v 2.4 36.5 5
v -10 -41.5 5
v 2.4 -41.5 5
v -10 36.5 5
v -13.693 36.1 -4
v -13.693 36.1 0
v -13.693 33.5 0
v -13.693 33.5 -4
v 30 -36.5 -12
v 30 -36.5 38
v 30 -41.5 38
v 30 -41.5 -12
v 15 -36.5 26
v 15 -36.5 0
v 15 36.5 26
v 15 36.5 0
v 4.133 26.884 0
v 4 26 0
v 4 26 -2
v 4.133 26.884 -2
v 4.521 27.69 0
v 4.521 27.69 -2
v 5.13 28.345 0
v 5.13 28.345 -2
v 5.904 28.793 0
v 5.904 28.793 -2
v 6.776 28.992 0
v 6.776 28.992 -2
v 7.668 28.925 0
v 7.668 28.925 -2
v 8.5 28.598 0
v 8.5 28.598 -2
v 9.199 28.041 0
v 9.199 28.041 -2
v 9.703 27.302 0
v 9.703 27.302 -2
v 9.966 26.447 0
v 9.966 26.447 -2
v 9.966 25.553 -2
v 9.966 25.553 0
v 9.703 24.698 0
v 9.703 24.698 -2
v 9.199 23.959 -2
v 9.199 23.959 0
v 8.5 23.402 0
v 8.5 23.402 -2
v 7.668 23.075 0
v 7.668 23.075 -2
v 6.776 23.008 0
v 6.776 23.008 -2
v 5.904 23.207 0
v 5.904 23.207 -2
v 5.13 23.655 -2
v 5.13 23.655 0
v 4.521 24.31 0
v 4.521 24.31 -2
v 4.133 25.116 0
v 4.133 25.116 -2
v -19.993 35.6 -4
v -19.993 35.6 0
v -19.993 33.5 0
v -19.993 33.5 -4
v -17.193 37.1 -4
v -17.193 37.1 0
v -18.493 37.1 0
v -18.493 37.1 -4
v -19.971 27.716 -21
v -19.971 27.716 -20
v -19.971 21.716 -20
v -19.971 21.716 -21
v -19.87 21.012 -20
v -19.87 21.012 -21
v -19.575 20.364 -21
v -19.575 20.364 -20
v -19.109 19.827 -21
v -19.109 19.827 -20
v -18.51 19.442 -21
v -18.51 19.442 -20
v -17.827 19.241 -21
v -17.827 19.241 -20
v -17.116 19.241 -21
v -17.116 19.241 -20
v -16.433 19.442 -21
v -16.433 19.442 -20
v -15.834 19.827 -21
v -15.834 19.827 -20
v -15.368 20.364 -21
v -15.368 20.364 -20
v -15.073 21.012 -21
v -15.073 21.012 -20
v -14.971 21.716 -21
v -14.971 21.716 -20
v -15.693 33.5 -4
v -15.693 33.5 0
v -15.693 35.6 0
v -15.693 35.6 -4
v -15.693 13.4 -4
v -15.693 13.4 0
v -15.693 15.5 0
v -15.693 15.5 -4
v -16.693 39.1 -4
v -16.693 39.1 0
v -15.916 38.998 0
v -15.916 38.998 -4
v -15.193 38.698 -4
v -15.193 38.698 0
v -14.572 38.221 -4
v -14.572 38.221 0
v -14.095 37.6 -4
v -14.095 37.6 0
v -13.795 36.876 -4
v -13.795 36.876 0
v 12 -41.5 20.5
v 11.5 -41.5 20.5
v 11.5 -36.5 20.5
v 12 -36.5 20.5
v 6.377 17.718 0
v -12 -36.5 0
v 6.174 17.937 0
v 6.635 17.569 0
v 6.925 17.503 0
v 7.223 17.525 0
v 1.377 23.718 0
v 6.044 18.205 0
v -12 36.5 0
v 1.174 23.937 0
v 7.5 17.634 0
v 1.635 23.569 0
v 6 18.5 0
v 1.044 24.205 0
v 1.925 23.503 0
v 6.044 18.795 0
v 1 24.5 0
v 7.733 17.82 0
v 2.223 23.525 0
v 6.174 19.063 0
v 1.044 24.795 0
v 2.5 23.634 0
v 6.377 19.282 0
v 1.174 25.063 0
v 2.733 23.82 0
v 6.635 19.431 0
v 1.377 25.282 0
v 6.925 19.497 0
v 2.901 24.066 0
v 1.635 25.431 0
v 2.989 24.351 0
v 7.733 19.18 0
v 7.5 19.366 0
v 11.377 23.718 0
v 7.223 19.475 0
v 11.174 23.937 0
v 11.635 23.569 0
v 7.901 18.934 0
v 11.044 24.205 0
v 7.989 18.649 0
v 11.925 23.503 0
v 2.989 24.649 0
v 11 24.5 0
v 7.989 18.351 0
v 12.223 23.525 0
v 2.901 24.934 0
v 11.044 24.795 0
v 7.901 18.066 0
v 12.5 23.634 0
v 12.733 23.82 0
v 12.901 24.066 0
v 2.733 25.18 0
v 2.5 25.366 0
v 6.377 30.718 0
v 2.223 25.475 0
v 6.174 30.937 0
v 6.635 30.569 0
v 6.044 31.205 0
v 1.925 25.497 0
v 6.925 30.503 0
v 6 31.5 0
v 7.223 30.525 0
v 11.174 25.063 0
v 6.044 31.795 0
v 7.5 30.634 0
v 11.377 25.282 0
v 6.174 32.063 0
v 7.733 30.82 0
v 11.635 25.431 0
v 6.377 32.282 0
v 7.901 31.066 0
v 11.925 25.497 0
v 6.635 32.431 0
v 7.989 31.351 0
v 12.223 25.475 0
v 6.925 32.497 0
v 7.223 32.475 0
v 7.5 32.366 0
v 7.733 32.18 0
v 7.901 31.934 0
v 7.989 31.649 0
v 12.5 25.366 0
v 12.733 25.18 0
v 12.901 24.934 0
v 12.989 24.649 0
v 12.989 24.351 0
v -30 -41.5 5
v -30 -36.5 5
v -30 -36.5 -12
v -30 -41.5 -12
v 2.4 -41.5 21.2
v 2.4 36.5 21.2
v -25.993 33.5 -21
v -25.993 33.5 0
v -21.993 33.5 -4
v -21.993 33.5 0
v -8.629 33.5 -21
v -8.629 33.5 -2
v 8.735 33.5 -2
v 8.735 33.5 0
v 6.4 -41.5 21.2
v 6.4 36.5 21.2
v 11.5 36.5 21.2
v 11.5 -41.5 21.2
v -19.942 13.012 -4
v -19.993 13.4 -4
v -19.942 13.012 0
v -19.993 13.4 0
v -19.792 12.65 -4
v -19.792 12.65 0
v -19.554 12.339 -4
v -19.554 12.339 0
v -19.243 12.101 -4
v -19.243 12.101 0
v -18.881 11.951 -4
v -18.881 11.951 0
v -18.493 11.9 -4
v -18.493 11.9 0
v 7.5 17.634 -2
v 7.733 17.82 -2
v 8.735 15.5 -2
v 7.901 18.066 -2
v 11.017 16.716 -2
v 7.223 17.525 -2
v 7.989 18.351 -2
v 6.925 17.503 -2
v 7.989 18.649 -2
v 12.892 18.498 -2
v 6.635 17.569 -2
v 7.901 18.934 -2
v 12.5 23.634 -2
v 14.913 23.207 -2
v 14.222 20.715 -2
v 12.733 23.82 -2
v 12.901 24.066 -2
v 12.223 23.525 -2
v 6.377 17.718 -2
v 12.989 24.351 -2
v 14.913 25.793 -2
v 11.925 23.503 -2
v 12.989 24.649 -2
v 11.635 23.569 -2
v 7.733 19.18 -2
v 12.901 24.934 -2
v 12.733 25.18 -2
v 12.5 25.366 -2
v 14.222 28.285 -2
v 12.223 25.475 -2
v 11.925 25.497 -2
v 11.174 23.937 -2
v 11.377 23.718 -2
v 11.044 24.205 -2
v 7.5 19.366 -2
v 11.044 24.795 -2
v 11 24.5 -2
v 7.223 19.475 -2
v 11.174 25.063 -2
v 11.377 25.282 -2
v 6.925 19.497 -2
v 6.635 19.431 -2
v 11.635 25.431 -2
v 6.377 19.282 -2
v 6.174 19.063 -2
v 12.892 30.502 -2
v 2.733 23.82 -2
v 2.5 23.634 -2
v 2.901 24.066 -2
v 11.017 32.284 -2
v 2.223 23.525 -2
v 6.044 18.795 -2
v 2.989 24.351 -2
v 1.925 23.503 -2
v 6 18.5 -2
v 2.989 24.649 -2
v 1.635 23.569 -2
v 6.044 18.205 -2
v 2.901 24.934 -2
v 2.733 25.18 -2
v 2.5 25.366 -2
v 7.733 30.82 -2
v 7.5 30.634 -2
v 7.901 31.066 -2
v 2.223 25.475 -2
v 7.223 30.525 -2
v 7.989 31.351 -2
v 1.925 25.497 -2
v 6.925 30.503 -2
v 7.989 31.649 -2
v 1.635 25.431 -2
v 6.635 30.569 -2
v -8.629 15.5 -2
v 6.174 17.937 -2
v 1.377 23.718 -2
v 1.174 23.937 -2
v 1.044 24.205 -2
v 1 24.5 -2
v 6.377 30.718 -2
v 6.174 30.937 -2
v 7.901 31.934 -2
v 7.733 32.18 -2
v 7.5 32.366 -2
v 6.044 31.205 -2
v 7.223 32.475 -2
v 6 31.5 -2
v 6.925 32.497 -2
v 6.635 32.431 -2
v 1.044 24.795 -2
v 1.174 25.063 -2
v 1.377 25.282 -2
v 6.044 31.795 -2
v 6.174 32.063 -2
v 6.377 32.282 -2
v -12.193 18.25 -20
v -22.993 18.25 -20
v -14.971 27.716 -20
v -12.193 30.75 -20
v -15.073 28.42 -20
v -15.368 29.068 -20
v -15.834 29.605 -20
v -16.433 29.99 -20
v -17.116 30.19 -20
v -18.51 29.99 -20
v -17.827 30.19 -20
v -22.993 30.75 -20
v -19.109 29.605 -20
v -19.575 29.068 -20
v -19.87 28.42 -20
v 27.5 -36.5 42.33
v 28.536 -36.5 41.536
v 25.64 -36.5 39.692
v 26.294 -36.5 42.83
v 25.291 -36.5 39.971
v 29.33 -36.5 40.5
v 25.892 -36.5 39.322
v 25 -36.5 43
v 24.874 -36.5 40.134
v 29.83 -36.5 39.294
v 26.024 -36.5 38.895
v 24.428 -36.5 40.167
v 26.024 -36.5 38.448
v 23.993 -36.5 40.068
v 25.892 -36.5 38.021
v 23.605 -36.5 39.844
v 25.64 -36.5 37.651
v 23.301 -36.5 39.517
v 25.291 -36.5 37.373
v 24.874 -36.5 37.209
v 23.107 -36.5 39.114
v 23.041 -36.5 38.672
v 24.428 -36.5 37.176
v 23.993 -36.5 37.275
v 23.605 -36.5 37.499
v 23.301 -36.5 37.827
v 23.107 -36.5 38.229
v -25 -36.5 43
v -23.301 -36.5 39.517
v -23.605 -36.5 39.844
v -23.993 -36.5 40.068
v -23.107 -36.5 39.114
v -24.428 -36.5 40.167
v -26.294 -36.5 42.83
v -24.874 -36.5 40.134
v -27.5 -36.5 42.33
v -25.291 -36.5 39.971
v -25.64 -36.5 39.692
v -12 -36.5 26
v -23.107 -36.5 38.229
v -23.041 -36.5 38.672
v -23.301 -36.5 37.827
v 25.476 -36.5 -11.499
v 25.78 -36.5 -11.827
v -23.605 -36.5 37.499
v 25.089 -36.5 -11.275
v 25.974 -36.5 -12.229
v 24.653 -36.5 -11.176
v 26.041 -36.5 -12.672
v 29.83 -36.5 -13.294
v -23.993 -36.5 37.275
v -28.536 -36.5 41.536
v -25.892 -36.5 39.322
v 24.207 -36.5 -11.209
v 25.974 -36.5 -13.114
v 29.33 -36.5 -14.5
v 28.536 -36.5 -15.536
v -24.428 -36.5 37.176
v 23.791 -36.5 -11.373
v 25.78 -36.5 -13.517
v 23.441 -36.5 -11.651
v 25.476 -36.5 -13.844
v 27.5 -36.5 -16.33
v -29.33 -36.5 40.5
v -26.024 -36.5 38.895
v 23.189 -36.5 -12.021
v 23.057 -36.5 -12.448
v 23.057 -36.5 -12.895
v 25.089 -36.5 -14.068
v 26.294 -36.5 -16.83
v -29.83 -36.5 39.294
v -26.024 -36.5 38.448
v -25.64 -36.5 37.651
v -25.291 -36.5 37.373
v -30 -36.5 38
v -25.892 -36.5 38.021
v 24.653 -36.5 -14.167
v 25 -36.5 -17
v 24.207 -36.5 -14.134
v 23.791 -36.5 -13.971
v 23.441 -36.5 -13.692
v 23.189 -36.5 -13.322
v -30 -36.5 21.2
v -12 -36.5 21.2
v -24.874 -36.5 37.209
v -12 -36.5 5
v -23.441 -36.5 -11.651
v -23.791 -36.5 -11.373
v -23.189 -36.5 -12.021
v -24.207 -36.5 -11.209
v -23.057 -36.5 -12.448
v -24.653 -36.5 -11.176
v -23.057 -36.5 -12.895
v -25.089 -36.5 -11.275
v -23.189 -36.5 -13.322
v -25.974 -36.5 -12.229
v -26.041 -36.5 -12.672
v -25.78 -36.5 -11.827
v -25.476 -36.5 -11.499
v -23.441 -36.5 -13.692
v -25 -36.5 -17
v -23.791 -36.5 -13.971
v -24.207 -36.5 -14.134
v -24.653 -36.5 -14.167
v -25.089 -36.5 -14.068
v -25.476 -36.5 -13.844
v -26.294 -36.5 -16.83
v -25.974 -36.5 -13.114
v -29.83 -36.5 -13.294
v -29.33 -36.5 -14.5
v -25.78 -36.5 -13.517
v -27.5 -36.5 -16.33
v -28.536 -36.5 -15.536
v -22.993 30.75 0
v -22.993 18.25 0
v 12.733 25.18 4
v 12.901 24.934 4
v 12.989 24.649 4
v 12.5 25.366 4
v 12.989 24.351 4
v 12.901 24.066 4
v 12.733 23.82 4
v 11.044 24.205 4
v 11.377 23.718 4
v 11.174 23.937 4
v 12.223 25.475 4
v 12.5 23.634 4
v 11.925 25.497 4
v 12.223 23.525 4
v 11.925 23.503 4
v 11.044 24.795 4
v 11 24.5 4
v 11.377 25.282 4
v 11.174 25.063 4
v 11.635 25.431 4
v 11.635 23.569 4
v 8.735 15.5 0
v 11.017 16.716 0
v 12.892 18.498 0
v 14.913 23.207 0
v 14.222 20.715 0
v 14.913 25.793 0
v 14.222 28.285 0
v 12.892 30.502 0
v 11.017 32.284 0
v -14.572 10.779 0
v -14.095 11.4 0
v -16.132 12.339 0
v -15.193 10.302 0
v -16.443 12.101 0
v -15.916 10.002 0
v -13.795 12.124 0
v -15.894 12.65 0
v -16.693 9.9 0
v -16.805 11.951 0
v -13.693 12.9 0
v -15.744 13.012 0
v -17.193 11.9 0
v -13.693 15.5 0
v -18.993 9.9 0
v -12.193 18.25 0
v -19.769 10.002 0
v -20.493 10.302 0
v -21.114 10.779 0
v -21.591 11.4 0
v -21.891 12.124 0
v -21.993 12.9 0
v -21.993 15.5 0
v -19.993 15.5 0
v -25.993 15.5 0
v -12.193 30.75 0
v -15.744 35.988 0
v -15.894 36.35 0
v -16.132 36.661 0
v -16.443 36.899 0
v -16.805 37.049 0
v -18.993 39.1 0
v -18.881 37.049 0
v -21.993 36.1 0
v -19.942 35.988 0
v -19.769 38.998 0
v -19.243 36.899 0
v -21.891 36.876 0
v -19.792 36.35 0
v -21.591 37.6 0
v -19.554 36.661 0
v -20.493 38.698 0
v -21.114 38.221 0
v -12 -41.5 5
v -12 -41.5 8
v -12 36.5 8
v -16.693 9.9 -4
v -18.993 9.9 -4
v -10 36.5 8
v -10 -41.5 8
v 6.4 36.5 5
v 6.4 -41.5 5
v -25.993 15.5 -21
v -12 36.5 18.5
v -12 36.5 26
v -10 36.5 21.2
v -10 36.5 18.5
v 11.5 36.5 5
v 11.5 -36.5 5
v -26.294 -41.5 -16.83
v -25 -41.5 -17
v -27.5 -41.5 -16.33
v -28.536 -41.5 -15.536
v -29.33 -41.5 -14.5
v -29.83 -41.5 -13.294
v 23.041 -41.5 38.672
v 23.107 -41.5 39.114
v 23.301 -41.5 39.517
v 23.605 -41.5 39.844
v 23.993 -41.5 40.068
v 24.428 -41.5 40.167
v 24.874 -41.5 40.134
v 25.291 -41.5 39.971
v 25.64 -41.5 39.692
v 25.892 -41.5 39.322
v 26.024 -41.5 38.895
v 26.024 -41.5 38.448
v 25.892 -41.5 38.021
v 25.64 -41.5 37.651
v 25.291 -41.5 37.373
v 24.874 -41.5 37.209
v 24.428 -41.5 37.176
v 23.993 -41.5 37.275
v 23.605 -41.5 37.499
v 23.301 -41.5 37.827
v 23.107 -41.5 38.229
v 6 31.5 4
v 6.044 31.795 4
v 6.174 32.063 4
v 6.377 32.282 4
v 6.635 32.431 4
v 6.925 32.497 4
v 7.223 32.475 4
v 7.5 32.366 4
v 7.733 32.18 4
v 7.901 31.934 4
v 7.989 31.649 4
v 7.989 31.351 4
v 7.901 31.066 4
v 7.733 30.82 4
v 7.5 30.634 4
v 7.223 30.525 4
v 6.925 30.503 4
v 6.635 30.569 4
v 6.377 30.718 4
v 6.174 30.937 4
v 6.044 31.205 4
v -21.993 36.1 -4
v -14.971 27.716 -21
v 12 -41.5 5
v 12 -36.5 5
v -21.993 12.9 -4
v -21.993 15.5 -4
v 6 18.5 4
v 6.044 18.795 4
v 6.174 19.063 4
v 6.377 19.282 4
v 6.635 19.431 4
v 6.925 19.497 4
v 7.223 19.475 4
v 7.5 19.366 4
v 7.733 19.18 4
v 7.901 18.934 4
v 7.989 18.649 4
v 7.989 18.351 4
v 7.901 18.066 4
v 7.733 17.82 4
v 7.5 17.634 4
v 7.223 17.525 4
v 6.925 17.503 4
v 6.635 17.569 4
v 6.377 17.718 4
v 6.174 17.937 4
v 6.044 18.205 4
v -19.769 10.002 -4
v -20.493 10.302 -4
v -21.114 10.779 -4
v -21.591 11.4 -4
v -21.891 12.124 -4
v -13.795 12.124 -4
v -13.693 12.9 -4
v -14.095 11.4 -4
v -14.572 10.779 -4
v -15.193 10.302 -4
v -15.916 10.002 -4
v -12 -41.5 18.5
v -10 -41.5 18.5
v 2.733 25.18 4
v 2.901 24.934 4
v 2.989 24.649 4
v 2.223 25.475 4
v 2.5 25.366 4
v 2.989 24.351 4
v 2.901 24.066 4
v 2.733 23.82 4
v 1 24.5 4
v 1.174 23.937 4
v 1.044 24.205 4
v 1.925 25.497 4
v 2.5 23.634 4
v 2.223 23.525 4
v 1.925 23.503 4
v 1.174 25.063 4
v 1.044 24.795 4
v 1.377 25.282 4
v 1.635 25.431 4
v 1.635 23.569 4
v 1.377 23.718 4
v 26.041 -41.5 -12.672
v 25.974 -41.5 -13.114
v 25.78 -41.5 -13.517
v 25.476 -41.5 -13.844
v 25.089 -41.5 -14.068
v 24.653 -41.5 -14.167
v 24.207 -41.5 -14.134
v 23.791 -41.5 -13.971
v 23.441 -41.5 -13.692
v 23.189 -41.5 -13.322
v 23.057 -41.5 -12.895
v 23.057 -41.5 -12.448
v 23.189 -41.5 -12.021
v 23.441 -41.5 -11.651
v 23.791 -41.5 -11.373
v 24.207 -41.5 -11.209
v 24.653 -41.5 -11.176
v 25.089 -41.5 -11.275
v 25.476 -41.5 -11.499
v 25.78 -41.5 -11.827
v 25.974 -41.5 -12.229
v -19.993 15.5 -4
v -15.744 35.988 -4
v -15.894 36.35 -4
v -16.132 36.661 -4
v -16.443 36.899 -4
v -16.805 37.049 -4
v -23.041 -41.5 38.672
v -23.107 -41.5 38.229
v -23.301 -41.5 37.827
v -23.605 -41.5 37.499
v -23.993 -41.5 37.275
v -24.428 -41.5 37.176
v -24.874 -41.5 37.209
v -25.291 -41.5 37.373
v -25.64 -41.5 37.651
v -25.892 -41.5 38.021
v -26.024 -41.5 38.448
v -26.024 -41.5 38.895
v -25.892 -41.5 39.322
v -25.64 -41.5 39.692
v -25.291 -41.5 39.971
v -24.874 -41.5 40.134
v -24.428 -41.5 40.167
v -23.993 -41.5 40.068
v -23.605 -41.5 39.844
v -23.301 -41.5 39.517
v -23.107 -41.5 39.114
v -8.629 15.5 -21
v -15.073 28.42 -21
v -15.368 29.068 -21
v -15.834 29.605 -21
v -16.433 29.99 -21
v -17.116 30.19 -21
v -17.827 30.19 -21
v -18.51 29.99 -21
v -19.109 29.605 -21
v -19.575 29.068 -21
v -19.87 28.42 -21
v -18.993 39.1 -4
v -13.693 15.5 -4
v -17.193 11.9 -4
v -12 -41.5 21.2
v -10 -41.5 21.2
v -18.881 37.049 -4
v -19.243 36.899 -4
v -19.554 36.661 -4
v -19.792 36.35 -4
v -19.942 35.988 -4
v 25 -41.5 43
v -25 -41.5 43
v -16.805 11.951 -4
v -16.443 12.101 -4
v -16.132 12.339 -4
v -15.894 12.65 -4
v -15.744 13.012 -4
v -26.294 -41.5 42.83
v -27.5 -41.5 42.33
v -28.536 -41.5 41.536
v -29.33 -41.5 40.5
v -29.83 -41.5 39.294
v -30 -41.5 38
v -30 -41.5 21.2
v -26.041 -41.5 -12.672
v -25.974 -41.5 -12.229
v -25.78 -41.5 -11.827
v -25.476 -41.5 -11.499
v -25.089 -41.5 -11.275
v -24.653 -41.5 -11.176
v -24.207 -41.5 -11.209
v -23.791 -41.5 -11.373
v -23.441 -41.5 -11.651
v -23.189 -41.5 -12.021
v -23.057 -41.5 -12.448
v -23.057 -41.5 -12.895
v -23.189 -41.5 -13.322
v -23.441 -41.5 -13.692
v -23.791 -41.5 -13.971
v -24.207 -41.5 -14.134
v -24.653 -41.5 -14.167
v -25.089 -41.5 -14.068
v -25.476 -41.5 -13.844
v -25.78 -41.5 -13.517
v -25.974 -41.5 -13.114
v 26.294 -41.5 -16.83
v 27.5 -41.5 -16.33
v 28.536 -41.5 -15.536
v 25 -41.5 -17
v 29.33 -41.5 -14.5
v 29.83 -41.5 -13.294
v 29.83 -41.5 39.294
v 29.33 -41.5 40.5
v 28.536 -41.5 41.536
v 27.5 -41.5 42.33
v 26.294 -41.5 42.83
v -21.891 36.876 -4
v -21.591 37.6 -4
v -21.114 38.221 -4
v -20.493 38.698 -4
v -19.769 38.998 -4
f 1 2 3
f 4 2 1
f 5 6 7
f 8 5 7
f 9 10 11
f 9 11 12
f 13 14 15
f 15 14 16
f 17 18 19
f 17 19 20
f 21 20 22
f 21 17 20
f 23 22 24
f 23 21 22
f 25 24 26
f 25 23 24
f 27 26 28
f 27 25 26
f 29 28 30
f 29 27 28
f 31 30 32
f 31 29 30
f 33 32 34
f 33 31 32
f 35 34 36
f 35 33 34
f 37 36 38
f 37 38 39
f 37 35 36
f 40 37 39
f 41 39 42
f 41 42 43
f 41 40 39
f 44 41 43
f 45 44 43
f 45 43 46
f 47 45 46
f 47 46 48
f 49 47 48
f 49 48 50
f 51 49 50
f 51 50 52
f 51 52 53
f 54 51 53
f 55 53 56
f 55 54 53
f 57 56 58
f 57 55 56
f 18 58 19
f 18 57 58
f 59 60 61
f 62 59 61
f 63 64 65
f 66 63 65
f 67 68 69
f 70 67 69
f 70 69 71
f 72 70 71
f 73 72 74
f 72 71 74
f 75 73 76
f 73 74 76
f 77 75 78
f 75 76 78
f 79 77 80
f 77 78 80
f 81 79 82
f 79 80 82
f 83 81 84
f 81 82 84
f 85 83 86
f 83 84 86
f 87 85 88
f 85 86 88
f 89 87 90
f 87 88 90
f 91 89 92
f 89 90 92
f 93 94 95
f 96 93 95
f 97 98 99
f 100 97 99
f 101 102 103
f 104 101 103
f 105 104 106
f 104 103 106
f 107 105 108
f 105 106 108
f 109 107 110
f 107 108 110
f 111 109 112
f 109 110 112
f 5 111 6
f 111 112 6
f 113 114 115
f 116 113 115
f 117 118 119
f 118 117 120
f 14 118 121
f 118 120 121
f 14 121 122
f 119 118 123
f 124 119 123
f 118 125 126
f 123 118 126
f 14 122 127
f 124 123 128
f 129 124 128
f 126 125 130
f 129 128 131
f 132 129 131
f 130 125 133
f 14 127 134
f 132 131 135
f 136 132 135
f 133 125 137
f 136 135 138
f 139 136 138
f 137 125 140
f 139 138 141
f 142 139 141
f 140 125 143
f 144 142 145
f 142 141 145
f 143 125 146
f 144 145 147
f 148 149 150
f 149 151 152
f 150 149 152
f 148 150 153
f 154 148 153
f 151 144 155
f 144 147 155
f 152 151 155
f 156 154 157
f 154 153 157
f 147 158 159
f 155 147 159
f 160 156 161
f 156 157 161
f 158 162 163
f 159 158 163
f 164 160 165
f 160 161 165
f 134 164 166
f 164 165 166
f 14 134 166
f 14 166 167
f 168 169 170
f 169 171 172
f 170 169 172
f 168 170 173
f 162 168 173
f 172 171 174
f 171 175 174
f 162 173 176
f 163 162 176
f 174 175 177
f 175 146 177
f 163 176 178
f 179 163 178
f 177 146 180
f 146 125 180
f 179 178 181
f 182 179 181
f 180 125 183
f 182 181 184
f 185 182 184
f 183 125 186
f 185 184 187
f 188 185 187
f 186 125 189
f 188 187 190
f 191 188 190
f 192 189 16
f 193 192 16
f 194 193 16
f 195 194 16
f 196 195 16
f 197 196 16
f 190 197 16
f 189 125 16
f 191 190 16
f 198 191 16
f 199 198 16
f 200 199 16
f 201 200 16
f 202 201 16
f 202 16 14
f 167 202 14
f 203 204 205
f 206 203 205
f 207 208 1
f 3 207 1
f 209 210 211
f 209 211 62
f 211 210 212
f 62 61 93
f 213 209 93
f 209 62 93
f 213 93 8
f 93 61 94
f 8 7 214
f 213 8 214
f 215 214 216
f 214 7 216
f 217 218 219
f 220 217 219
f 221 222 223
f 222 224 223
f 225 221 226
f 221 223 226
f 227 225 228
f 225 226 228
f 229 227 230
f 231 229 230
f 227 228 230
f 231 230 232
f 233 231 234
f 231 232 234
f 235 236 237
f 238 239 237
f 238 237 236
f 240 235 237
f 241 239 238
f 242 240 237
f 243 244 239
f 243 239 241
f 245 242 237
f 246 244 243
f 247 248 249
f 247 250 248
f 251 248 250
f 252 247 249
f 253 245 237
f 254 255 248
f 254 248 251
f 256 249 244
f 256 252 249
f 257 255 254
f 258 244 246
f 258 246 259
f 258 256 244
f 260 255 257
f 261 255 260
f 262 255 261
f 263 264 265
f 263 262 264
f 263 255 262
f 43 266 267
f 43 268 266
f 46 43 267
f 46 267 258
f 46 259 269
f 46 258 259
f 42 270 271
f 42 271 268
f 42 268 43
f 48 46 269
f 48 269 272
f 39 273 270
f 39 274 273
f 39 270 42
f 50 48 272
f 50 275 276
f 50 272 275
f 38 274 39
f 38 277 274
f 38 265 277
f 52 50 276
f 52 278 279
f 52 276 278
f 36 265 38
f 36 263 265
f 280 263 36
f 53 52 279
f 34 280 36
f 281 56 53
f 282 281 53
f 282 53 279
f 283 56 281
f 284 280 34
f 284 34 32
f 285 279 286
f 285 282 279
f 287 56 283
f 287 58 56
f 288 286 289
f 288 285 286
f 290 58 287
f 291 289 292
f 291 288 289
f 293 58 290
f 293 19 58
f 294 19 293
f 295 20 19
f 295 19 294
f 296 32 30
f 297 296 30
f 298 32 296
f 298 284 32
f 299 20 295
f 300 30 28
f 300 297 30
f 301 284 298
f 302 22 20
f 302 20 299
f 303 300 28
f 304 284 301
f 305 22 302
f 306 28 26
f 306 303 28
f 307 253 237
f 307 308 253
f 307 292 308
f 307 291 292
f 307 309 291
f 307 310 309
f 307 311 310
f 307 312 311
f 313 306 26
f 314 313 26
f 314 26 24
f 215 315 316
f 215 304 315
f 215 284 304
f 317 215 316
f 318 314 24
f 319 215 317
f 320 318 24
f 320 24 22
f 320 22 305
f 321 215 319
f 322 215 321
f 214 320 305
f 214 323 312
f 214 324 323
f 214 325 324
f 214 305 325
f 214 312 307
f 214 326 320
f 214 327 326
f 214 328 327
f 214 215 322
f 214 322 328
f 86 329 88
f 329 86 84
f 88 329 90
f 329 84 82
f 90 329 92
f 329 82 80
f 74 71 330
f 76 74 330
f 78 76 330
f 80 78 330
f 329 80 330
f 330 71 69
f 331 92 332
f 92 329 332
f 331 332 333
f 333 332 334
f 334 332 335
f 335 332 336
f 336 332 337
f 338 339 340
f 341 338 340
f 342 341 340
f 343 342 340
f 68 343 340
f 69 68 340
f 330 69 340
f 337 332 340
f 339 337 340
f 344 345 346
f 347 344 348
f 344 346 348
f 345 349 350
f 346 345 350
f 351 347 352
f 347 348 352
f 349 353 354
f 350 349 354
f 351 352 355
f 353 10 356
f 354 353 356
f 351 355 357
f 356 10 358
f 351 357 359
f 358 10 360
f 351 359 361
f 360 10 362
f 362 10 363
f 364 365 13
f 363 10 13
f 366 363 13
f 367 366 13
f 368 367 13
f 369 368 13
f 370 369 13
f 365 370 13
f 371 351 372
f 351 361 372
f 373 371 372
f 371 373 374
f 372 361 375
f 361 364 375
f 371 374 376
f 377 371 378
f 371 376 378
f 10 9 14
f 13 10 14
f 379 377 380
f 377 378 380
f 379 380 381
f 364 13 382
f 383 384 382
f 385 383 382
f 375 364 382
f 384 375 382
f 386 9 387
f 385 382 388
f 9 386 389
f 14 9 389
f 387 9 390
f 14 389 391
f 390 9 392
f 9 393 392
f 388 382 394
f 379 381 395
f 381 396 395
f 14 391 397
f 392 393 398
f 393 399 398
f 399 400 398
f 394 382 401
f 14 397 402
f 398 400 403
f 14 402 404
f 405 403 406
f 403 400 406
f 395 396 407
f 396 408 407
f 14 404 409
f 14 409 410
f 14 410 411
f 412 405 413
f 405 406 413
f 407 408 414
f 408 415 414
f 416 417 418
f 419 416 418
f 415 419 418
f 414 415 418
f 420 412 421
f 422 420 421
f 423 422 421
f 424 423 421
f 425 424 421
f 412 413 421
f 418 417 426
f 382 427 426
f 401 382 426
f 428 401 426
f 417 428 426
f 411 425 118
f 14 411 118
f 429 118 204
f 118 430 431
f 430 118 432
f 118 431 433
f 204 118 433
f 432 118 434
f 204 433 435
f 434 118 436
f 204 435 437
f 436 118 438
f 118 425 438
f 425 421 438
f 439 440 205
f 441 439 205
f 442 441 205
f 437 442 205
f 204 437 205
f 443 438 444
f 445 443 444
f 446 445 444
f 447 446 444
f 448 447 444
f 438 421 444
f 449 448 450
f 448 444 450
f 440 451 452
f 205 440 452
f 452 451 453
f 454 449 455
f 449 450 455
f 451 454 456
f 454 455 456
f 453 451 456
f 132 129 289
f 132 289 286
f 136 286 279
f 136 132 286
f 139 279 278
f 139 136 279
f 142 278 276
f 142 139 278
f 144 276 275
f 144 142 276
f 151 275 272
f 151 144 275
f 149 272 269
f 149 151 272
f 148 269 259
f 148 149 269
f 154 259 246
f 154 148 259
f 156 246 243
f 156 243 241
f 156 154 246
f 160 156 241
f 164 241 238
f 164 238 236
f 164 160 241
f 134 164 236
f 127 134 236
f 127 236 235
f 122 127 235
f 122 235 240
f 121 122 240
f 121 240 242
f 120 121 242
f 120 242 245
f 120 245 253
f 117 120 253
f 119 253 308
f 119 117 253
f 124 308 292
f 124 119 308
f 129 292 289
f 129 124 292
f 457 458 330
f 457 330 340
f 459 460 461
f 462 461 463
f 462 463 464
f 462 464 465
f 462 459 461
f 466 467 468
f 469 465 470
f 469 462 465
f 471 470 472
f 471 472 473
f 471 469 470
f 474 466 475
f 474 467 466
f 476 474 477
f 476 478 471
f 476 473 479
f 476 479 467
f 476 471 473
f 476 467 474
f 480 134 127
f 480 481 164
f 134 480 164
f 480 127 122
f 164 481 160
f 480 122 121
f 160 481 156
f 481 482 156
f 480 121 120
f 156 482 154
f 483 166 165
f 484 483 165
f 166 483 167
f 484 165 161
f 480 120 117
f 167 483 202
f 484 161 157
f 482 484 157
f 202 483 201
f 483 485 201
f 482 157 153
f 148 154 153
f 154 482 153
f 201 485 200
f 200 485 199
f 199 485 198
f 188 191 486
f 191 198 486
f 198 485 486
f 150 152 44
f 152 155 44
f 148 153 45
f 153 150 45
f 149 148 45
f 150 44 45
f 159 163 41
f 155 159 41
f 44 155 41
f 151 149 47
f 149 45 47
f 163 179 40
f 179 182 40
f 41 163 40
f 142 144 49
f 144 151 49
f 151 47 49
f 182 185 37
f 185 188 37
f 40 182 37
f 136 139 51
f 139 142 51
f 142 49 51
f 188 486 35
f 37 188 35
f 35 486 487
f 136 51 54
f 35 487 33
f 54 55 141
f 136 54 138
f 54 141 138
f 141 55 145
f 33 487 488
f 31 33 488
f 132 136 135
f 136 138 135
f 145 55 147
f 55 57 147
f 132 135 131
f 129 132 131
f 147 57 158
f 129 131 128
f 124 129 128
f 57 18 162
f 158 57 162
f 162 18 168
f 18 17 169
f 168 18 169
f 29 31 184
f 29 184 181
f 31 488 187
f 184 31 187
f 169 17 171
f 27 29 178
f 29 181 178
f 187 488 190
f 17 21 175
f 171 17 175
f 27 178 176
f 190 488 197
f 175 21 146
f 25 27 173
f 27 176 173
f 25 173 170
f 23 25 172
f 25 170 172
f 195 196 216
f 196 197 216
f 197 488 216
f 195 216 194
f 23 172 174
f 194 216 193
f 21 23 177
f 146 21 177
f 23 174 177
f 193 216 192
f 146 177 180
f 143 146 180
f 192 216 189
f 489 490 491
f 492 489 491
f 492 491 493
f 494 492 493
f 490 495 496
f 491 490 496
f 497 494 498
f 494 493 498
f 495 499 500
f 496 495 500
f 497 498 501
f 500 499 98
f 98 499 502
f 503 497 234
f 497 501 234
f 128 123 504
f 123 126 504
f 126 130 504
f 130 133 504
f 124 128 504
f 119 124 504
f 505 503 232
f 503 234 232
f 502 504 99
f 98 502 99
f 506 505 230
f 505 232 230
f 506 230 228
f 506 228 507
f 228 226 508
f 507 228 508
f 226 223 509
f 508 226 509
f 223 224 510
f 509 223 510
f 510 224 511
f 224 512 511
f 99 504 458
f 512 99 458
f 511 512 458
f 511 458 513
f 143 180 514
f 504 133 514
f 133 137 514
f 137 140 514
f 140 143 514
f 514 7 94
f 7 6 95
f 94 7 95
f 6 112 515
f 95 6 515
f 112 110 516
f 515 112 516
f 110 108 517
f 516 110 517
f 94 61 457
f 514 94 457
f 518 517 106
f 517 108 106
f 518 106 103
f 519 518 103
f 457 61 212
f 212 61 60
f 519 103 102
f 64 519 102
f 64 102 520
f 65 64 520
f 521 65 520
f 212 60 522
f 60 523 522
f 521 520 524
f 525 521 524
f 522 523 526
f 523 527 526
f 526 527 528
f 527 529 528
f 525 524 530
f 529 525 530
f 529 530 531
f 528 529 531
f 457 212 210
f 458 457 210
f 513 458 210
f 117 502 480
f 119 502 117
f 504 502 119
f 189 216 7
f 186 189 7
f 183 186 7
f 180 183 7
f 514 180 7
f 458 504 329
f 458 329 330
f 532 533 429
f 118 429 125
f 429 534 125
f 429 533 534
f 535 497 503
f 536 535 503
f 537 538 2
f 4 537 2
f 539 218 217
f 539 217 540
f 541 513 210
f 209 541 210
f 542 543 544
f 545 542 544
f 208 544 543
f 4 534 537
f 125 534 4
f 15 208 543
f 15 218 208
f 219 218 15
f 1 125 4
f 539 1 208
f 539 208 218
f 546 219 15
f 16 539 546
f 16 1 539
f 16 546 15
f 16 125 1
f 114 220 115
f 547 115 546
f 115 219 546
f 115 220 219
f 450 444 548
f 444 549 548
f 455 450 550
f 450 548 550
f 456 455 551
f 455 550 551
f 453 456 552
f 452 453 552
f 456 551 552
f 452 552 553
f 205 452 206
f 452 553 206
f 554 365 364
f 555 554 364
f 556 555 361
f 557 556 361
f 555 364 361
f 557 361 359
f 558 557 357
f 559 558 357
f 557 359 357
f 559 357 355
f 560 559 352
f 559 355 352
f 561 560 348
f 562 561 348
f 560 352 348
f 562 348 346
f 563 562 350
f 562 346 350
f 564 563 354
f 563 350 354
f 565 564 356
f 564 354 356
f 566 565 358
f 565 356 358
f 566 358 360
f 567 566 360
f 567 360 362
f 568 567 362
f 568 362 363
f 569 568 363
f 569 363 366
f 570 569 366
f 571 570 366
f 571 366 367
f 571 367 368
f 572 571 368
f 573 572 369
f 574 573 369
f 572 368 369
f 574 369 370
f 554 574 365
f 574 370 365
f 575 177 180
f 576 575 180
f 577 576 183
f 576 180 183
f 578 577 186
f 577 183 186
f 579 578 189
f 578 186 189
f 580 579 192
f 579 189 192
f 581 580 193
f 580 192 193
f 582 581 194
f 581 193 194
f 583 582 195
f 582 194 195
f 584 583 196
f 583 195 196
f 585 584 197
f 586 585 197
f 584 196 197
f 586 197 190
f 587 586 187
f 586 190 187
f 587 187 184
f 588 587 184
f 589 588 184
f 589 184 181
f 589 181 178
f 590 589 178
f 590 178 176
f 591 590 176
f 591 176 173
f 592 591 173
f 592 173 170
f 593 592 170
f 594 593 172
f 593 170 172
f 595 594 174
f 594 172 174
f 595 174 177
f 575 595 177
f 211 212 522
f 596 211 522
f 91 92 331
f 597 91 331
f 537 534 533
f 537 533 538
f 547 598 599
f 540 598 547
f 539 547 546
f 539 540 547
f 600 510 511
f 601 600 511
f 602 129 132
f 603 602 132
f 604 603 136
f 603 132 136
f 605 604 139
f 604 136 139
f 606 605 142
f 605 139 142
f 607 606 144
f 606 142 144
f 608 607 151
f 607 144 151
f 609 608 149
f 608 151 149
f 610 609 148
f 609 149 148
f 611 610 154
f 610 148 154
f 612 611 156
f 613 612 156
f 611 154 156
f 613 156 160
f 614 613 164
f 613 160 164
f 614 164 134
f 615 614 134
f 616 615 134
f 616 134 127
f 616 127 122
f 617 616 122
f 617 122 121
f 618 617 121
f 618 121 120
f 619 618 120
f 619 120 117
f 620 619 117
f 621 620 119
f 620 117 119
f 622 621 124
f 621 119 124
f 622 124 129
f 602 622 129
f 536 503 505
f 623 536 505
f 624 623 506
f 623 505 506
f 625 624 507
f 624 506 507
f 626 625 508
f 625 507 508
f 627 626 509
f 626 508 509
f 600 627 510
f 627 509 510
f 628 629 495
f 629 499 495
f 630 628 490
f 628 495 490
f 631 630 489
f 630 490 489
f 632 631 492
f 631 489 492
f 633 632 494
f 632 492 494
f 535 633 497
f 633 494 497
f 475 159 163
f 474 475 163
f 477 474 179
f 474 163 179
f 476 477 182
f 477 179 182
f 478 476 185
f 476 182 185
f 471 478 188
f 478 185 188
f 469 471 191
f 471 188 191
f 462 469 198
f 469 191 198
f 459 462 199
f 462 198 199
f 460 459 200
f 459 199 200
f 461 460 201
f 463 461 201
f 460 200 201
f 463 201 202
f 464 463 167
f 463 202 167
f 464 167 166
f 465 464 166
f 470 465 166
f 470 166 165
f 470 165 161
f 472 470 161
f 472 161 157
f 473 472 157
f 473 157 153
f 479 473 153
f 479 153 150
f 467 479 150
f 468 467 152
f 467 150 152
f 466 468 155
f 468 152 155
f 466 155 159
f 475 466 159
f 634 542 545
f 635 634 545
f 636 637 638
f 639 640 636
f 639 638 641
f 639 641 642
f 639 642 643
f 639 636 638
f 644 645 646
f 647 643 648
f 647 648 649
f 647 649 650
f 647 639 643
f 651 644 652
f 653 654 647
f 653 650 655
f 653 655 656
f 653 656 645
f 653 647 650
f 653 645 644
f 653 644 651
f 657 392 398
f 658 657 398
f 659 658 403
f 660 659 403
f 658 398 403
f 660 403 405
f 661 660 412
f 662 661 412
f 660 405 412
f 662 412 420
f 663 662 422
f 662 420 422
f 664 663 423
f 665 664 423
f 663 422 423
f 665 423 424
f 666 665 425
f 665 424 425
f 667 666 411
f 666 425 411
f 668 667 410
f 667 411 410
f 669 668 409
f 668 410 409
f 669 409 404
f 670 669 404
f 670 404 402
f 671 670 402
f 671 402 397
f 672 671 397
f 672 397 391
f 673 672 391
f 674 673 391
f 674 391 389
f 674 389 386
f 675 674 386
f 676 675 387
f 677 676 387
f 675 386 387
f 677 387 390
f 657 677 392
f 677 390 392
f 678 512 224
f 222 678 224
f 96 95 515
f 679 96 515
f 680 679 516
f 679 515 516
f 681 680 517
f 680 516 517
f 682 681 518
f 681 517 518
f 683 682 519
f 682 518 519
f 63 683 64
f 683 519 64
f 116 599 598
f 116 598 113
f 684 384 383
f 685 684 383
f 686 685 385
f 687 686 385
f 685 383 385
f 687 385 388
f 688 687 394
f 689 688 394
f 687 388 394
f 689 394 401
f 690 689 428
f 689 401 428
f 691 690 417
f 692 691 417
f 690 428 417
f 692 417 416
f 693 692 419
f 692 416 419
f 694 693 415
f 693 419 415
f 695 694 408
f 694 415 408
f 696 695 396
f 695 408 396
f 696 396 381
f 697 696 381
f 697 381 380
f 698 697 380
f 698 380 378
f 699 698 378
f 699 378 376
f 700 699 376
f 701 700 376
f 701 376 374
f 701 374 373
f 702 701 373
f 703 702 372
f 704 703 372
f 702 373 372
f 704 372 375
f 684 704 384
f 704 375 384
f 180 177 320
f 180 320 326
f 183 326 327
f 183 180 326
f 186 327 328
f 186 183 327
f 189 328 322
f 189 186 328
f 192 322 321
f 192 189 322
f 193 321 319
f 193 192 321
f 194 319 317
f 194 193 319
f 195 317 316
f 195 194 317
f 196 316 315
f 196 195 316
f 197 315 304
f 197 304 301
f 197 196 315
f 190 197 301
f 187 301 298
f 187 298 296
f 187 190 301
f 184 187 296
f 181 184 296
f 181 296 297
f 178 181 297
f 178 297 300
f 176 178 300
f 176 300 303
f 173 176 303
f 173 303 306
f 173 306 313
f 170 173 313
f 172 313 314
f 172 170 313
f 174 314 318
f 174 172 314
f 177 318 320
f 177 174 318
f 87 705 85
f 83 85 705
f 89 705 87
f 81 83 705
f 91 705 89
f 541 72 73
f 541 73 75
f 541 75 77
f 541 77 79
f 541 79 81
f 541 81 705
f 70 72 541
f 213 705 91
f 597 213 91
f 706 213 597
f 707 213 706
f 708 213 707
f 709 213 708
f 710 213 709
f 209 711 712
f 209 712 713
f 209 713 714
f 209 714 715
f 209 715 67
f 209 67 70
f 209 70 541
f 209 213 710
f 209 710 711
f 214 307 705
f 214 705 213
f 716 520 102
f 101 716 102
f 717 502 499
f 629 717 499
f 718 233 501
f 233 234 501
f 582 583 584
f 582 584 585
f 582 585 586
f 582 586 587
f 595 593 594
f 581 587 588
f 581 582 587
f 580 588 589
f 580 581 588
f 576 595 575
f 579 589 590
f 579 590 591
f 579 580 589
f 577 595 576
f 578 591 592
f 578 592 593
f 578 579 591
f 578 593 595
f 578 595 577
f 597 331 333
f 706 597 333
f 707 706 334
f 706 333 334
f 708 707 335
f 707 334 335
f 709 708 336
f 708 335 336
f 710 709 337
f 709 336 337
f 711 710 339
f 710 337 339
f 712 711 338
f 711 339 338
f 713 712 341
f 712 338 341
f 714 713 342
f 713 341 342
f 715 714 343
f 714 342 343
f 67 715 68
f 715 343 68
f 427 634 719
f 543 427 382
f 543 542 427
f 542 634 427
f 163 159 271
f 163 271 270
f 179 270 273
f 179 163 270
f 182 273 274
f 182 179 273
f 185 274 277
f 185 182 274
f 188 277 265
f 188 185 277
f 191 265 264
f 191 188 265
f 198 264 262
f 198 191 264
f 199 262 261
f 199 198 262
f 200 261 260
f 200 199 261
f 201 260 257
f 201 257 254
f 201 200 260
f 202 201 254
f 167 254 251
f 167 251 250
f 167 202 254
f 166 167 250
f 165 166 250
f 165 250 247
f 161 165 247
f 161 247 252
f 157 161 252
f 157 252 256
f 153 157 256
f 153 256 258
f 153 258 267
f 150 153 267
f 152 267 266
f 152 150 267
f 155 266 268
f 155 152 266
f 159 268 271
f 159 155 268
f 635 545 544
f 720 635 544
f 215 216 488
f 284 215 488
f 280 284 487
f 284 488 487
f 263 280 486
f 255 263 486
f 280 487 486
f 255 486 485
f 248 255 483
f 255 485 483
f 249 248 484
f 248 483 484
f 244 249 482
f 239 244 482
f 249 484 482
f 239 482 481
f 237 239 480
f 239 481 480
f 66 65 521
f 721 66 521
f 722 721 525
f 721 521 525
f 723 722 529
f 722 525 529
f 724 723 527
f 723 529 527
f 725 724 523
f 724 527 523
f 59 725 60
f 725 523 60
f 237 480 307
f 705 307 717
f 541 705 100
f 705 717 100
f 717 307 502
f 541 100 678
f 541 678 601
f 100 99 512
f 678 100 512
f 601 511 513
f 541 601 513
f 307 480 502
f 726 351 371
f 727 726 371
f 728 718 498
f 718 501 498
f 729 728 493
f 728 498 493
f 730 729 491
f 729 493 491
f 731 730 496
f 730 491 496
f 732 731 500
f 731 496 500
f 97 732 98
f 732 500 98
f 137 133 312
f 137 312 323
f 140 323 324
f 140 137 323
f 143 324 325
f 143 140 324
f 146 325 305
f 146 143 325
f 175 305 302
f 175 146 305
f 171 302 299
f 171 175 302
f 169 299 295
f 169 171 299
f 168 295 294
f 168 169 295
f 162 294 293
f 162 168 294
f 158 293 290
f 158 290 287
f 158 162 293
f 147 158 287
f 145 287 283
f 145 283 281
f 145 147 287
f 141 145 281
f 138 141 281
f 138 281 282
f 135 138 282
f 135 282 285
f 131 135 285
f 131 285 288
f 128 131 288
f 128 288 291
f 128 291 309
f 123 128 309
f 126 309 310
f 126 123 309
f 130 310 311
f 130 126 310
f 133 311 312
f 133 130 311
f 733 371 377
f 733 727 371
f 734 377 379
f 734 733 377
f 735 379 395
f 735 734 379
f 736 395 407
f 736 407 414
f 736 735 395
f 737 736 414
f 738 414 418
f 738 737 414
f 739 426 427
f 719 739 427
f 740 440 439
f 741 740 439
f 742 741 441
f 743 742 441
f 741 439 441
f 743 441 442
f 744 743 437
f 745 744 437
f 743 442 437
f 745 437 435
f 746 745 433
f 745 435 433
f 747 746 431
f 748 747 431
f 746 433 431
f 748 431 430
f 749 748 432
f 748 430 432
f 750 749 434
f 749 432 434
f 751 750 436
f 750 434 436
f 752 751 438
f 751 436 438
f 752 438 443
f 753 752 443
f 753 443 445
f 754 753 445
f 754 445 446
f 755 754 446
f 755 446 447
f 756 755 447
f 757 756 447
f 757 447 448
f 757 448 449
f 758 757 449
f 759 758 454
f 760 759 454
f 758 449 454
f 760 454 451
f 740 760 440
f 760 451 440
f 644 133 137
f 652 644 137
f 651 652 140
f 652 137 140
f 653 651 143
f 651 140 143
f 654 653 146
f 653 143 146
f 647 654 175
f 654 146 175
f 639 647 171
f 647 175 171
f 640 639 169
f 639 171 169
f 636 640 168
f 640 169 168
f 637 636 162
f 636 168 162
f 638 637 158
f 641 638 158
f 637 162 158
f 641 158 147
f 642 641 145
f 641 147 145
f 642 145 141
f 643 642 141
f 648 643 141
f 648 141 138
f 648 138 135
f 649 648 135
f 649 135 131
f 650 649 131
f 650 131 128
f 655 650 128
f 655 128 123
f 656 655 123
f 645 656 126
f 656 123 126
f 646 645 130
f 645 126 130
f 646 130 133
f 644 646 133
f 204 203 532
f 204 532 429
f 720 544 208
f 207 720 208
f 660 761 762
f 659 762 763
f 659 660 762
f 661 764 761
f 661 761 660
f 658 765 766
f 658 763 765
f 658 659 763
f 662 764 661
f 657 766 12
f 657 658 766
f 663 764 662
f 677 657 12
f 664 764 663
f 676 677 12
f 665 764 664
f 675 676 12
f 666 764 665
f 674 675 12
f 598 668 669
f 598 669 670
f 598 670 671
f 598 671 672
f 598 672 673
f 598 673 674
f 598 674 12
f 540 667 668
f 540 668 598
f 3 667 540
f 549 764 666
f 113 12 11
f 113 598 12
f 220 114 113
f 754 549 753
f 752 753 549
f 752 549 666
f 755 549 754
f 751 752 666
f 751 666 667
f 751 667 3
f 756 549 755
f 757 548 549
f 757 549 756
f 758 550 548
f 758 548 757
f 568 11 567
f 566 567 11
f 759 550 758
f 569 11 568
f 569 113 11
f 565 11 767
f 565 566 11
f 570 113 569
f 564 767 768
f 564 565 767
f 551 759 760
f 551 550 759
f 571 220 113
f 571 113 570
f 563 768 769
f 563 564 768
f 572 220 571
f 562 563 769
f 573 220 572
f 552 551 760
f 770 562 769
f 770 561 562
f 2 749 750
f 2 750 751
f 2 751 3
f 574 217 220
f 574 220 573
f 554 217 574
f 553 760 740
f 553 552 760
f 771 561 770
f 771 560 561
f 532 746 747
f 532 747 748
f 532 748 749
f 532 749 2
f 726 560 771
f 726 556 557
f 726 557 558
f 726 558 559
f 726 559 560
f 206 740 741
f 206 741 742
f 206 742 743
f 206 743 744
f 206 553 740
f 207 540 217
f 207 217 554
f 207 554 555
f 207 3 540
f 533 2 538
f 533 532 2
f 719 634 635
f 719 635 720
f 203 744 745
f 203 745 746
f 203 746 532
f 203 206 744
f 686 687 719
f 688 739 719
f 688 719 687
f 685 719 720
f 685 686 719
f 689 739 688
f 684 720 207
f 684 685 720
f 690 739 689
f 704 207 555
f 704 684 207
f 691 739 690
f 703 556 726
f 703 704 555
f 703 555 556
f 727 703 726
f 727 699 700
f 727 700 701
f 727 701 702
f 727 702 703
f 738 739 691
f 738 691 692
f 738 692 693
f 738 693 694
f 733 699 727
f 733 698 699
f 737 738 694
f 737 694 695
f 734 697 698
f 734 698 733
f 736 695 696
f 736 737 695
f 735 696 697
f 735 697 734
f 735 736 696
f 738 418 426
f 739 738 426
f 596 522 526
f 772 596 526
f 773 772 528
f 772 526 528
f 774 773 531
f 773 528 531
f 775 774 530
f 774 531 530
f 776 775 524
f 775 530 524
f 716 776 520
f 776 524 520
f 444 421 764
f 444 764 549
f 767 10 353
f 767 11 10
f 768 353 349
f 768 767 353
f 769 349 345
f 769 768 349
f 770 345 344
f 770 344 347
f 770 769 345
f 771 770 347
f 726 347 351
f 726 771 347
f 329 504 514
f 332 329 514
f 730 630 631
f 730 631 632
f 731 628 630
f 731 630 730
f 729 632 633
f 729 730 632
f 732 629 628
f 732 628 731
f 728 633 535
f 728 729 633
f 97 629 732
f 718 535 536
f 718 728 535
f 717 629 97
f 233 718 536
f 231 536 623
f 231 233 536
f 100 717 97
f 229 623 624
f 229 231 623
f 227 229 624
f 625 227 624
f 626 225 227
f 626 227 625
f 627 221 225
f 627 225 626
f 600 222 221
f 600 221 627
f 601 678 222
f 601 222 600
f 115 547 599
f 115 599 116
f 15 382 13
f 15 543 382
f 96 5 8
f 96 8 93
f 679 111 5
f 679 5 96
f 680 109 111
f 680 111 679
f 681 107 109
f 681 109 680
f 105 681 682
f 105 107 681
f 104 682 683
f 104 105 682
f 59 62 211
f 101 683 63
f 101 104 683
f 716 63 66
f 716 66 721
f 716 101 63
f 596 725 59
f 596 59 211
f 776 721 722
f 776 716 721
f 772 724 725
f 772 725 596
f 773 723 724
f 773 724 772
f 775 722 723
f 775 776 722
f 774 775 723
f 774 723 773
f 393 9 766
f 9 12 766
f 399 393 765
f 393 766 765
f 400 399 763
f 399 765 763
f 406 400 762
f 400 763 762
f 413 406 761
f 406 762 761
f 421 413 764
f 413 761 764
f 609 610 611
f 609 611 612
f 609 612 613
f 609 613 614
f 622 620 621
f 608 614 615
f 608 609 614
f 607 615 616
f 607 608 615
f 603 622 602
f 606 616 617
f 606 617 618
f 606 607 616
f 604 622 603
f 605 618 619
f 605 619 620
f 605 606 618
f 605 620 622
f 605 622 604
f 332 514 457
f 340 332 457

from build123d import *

# Parameters (mm, degrees)
SKETCH1_W                    = 30
SKETCH1_H                    = 73
BOSS_EXTRUDE1_DEPTH          = 26
SKETCH2_W                    = 25
SKETCH2_H                    = 16.2
CUT_EXTRUDE1_DEPTH           = 79.930349043
SKETCH3_W                    = 26
SKETCH3_H                    = 24
SKETCH3_H_2                  = 16.23422306
CUT_EXTRUDE2_DEPTH           = 5
SKETCH5_W                    = 60
SKETCH5_H                    = 60
BOSS_EXTRUDE2_DEPTH          = 5
FILLET1_R                    = 5
SKETCH6_R                    = 1.5
CUT_EXTRUDE4_DEPTH           = 5
SKETCH7_R                    = 1
CUT_EXTRUDE5_DEPTH           = 4
SKETCH8_W                    = 15.5
SKETCH8_H                    = 5
CUT_EXTRUDE6_DEPTH           = 42
SKETCH9_W                    = 5
SKETCH9_H                    = 26
CUT_EXTRUDE7_DEPTH           = 73
SKETCH10_W                   = 2
SKETCH10_H                   = 8
SKETCH10_H_2                 = 7.5
BOSS_EXTRUDE3_DEPTH          = 78
SKETCH11_W                   = 41.5
SKETCH11_H                   = 0.7
CUT_EXTRUDE8_DEPTH           = 90.877694674
SKETCH13_W                   = 0.7
SKETCH13_H                   = 5
BOSS_EXTRUDE5_DEPTH          = 2
SKETCH15_W                   = 4
SKETCH15_H                   = 16.2
BOSS_EXTRUDE6_DEPTH          = 78
MOTOR_START                  = 62.773326215
MOTOR_PLATFORM_OUTLINE_W     = 17.3641812
MOTOR_PLATFORM_OUTLINE_H     = 18
MOTOR_PLATFORM_OUTLINE_W_2   = 10.8
MOTOR_PLATFORM_OUTLINE_H_2   = 12.5
MOTOR_PLATFORM_DEPTH         = 21
MOTOR_PLATFORM_2_OUTLINE_R   = 1
MOTOR_PLATFORM_2_OUTLINE_R_2 = 3
MOTOR_PLATFORM_2_DEPTH       = 2
MOTOR_START_2                = 64.773326215
MOTOR_PLATFORM_3_DEPTH       = 2
MOTOR_START_3                = 82.773326215
MOTOR_PLATFORM_4_OUTLINE_W   = 10.8
MOTOR_PLATFORM_4_OUTLINE_H   = 12.5
MOTOR_PLATFORM_4_DEPTH       = 1
BODY_MOVE_COPY1_ANGLE        = 180


with BuildPart() as part:
    # Sketch1 → Boss-Extrude1 (new body)
    with BuildSketch(Plane.XY):
        Rectangle(SKETCH1_W, SKETCH1_H)
    extrude(amount=BOSS_EXTRUDE1_DEPTH)

    # Sketch2 → Cut-Extrude1 (cut, through all)
    with BuildSketch(Plane(origin=(0, 36.5, 0), x_dir=(1, 0, 0), z_dir=(0, 1, 0))):
        with Locations((-1, -13.1)):
            Rectangle(SKETCH2_W, SKETCH2_H)
    extrude(amount=-CUT_EXTRUDE1_DEPTH, mode=Mode.SUBTRACT)

    # Sketch3 → Cut-Extrude2 (cut)
    with BuildSketch(Plane.ZY.offset(15)):
        with Locations((13, 21.5)):
            Rectangle(SKETCH3_W, SKETCH3_H)
        with Locations((13, -5.5)):
            Rectangle(SKETCH3_W, SKETCH3_H)
        with Locations((13, -28.61711153)):
            Rectangle(SKETCH3_W, SKETCH3_H_2)
    extrude(amount=-CUT_EXTRUDE2_DEPTH, mode=Mode.SUBTRACT)

    # Sketch5 → Boss-Extrude2 (add)
    with BuildSketch(Plane(origin=(0, -36.5, 0), x_dir=(-1, 0, 0), z_dir=(0, -1, 0))):
        with Locations((0, -13)):
            Rectangle(SKETCH5_W, SKETCH5_H)
    extrude(amount=BOSS_EXTRUDE2_DEPTH)

    # Fillet1
    fillet1_edges = [part.edges().sort_by_distance(p)[0] for p in [
        (30, -39, -17),
        (30, -39, 43),
        (-30, -39, 43),
        (-30, -39, -17),
    ]]
    fillet(fillet1_edges, radius=FILLET1_R)

    # Sketch6 → Cut-Extrude4 (cut)
    with BuildSketch(Plane(origin=(0, -36.5, 0), x_dir=(1, 0, 0), z_dir=(0, 1, 0))):
        with Locations(Location((-24.540514854, 12.671548216, 0), (0, 0, 180))):
            Circle(SKETCH6_R)
        with Locations((24.540514854, 12.671548216)):
            Circle(SKETCH6_R)
        with Locations((-24.540514854, -38.671548216)):
            Circle(SKETCH6_R)
        with Locations(Location((24.540514854, -38.671548216, 0), (0, 0, 180))):
            Circle(SKETCH6_R)
    extrude(amount=-CUT_EXTRUDE4_DEPTH, mode=Mode.SUBTRACT)

    # Sketch7 → Cut-Extrude5 (cut)
    with BuildSketch(Plane(origin=(0, 0, 0), x_dir=(-1, 0, 0), z_dir=(0, 0, -1))):
        with Locations((-7, 31.5)):
            Circle(SKETCH7_R)
        with Locations((-12, 24.5)):
            Circle(SKETCH7_R)
        with Locations((-2, 24.5)):
            Circle(SKETCH7_R)
        with Locations((-7, 18.5)):
            Circle(SKETCH7_R)
    extrude(amount=-CUT_EXTRUDE5_DEPTH, mode=Mode.SUBTRACT)

    # Sketch8 → Cut-Extrude6 (cut)
    with BuildSketch(Plane.ZY.offset(30)):
        with Locations((12.75, -39)):
            Rectangle(SKETCH8_W, SKETCH8_H)
    extrude(amount=-CUT_EXTRUDE6_DEPTH, mode=Mode.SUBTRACT)

    # Sketch9 → Cut-Extrude7 (cut)
    with BuildSketch(Plane(origin=(0, 36.5, 0), x_dir=(1, 0, 0), z_dir=(0, 1, 0))):
        with Locations((-12.5, -13)):
            Rectangle(SKETCH9_W, SKETCH9_H)
    extrude(amount=-CUT_EXTRUDE7_DEPTH, mode=Mode.SUBTRACT)

    # Sketch10 → Boss-Extrude3 (add)
    with BuildSketch(Plane(origin=(0, 36.5, 0), x_dir=(1, 0, 0), z_dir=(0, 1, 0))):
        with Locations((-11, -4)):
            Rectangle(SKETCH10_W, SKETCH10_H)
        with Locations((-11, -22.25)):
            Rectangle(SKETCH10_W, SKETCH10_H_2)
    extrude(amount=-BOSS_EXTRUDE3_DEPTH)

    # Sketch11 → Cut-Extrude8 (cut, through all)
    with BuildSketch(Plane(origin=(0, -36.5, 0), x_dir=(1, 0, 0), z_dir=(0, 1, 0))):
        with Locations((-9.25, -20.85)):
            Rectangle(SKETCH11_W, SKETCH11_H)
    extrude(amount=-CUT_EXTRUDE8_DEPTH, mode=Mode.SUBTRACT)

    # Sketch13 → Boss-Extrude5 (add)
    with BuildSketch(Plane.ZY.offset(12)):
        with Locations((20.85, -39)):
            Rectangle(SKETCH13_W, SKETCH13_H)
    extrude(amount=-BOSS_EXTRUDE5_DEPTH)

    # Sketch15 → Boss-Extrude6 (add)
    with BuildSketch(Plane(origin=(0, 36.5, 0), x_dir=(1, 0, 0), z_dir=(0, 1, 0))):
        with Locations((4.4, -13.1)):
            Rectangle(SKETCH15_W, SKETCH15_H)
    extrude(amount=-BOSS_EXTRUDE6_DEPTH)


with BuildPart() as body_2:
    # motor platform: read off the stored shape, not the designer's step
    # motor platform outline → motor platform (new body)
    with BuildSketch(Plane.XY.offset(MOTOR_START)):
        with Locations((55.40107427, 57.368007859)):
            Rectangle(MOTOR_PLATFORM_OUTLINE_W, MOTOR_PLATFORM_OUTLINE_H)
        with Locations((55.68316487, 57.368007859)):
            Rectangle(MOTOR_PLATFORM_OUTLINE_W_2, MOTOR_PLATFORM_OUTLINE_H_2, mode=Mode.SUBTRACT)
    extrude(amount=MOTOR_PLATFORM_DEPTH)

    # motor platform 2 outline → motor platform 2 (add)
    # profile 1 of 3: a face of its own
    with BuildSketch(Plane.XY.offset(MOTOR_START)):
        with BuildLine():
            Line((60.08316487, 45.768007859), (60.08316487, 48.368007859))
            Line((60.08316487, 48.368007859), (58.08316487, 48.368007859))
            Line((58.08316487, 48.368007859), (58.08316487, 46.268007859))
            ThreePointArc((58.08316487, 46.268007859), (57.643825042, 45.207347687), (56.58316487, 44.768007859))
            Line((56.58316487, 44.768007859), (55.28316487, 44.768007859))
            ThreePointArc((55.28316487, 44.768007859), (54.222504698, 45.207347687), (53.78316487, 46.268007859))
            Line((53.78316487, 46.268007859), (53.78316487, 48.368007859))
            Line((53.78316487, 48.368007859), (51.78316487, 48.368007859))
            Line((51.78316487, 48.368007859), (51.78316487, 45.768007859))
            ThreePointArc((51.78316487, 45.768007859), (52.661844527, 43.646687515), (54.78316487, 42.768007859))
            Line((54.78316487, 42.768007859), (57.08316487, 42.768007859))
            ThreePointArc((57.08316487, 42.768007859), (59.204485214, 43.646687515), (60.08316487, 45.768007859))
        make_face()
    # profile 2 of 3: a face of its own
    with BuildSketch(Plane.XY.offset(MOTOR_START)):
        with BuildLine():
            Line((58.08316487, 66.368007859), (60.08316487, 66.368007859))
            Line((60.08316487, 66.368007859), (60.08316487, 68.968007859))
            ThreePointArc((60.08316487, 68.968007859), (59.204485214, 71.089328202), (57.08316487, 71.968007859))
            Line((57.08316487, 71.968007859), (54.78316487, 71.968007859))
            ThreePointArc((54.78316487, 71.968007859), (52.661844527, 71.089328202), (51.78316487, 68.968007859))
            Line((51.78316487, 68.968007859), (51.78316487, 66.368007859))
            Line((51.78316487, 66.368007859), (53.78316487, 66.368007859))
            Line((53.78316487, 66.368007859), (53.78316487, 68.468007859))
            ThreePointArc((53.78316487, 68.468007859), (54.222504698, 69.528668031), (55.28316487, 69.968007859))
            Line((55.28316487, 69.968007859), (56.58316487, 69.968007859))
            ThreePointArc((56.58316487, 69.968007859), (57.643825042, 69.528668031), (58.08316487, 68.468007859))
            Line((58.08316487, 68.468007859), (58.08316487, 66.368007859))
        make_face()
    # profile 3 of 3: a face of its own
    with BuildSketch(Plane.XY.offset(MOTOR_START)):
        with BuildLine():
            Line((29.354802469, 48.368007859), (46.71898367, 48.368007859))
            Line((46.71898367, 48.368007859), (46.71898367, 66.368007859))
            Line((46.71898367, 66.368007859), (29.354802469, 66.368007859))
            ThreePointArc((29.354802469, 66.368007859), (23.090237203, 57.368007859), (29.354802469, 48.368007859))
        make_face()
        with Locations((31.09028738, 51.368007859)):
            Circle(MOTOR_PLATFORM_2_OUTLINE_R, mode=Mode.SUBTRACT)
        with Locations((26.09028738, 57.368007859)):
            Circle(MOTOR_PLATFORM_2_OUTLINE_R, mode=Mode.SUBTRACT)
        with Locations((31.09028738, 58.868007859)):
            Circle(MOTOR_PLATFORM_2_OUTLINE_R_2, mode=Mode.SUBTRACT)
        with Locations((31.09028738, 64.368007859)):
            Circle(MOTOR_PLATFORM_2_OUTLINE_R, mode=Mode.SUBTRACT)
        with Locations((36.09028738, 57.368007859)):
            Circle(MOTOR_PLATFORM_2_OUTLINE_R, mode=Mode.SUBTRACT)
    extrude(amount=MOTOR_PLATFORM_2_DEPTH)

    # motor platform 3 outline → motor platform 3 (add)
    with BuildSketch(Plane.XY.offset(MOTOR_START_2)):
        with BuildLine():
            Line((60.08316487, 45.768007859), (60.08316487, 48.368007859))
            Line((60.08316487, 48.368007859), (58.08316487, 48.368007859))
            Line((58.08316487, 48.368007859), (58.08316487, 46.268007859))
            ThreePointArc((58.08316487, 46.268007859), (57.643825042, 45.207347687), (56.58316487, 44.768007859))
            Line((56.58316487, 44.768007859), (55.28316487, 44.768007859))
            ThreePointArc((55.28316487, 44.768007859), (54.222504698, 45.207347687), (53.78316487, 46.268007859))
            Line((53.78316487, 46.268007859), (53.78316487, 48.368007859))
            Line((53.78316487, 48.368007859), (51.78316487, 48.368007859))
            Line((51.78316487, 48.368007859), (51.78316487, 45.768007859))
            ThreePointArc((51.78316487, 45.768007859), (52.661844527, 43.646687515), (54.78316487, 42.768007859))
            Line((54.78316487, 42.768007859), (57.08316487, 42.768007859))
            ThreePointArc((57.08316487, 42.768007859), (59.204485214, 43.646687515), (60.08316487, 45.768007859))
        make_face()
        with BuildLine():
            Line((58.08316487, 66.368007859), (60.08316487, 66.368007859))
            Line((60.08316487, 66.368007859), (60.08316487, 68.968007859))
            ThreePointArc((60.08316487, 68.968007859), (59.204485214, 71.089328202), (57.08316487, 71.968007859))
            Line((57.08316487, 71.968007859), (54.78316487, 71.968007859))
            ThreePointArc((54.78316487, 71.968007859), (52.661844527, 71.089328202), (51.78316487, 68.968007859))
            Line((51.78316487, 68.968007859), (51.78316487, 66.368007859))
            Line((51.78316487, 66.368007859), (53.78316487, 66.368007859))
            Line((53.78316487, 66.368007859), (53.78316487, 68.468007859))
            ThreePointArc((53.78316487, 68.468007859), (54.222504698, 69.528668031), (55.28316487, 69.968007859))
            Line((55.28316487, 69.968007859), (56.58316487, 69.968007859))
            ThreePointArc((56.58316487, 69.968007859), (57.643825042, 69.528668031), (58.08316487, 68.468007859))
            Line((58.08316487, 68.468007859), (58.08316487, 66.368007859))
        make_face()
    extrude(amount=MOTOR_PLATFORM_3_DEPTH)

    # motor platform 4 outline → motor platform 4 (add)
    with BuildSketch(Plane.XY.offset(MOTOR_START_3)):
        with Locations((55.68316487, 57.368007859)):
            Rectangle(MOTOR_PLATFORM_4_OUTLINE_W, MOTOR_PLATFORM_4_OUTLINE_H)
        with BuildLine():
            ThreePointArc((53.061742153, 60.583943356), (55.561742153, 63.083943356), (58.061742153, 60.583943356))
            Line((58.061742153, 60.583943356), (58.061742153, 54.583943356))
            ThreePointArc((58.061742153, 54.583943356), (55.561742153, 52.083943356), (53.061742153, 54.583943356))
            Line((53.061742153, 54.583943356), (53.061742153, 60.583943356))
        make_face(mode=Mode.SUBTRACT)
    extrude(amount=MOTOR_PLATFORM_4_DEPTH)


with BuildPart() as body_2_1:
    # Body-Move/Copy1: read off the stored shape, not the designer's step
    # Body-Move/Copy1: moved
    add(body_2.part.moved(Location((-38.0902874, -32.8680079, -62.7733262))).rotate(Axis((0, 0, 0), (0, 1, 0)), BODY_MOVE_COPY1_ANGLE))


solid = Compound([part.part, body_2_1.part])
